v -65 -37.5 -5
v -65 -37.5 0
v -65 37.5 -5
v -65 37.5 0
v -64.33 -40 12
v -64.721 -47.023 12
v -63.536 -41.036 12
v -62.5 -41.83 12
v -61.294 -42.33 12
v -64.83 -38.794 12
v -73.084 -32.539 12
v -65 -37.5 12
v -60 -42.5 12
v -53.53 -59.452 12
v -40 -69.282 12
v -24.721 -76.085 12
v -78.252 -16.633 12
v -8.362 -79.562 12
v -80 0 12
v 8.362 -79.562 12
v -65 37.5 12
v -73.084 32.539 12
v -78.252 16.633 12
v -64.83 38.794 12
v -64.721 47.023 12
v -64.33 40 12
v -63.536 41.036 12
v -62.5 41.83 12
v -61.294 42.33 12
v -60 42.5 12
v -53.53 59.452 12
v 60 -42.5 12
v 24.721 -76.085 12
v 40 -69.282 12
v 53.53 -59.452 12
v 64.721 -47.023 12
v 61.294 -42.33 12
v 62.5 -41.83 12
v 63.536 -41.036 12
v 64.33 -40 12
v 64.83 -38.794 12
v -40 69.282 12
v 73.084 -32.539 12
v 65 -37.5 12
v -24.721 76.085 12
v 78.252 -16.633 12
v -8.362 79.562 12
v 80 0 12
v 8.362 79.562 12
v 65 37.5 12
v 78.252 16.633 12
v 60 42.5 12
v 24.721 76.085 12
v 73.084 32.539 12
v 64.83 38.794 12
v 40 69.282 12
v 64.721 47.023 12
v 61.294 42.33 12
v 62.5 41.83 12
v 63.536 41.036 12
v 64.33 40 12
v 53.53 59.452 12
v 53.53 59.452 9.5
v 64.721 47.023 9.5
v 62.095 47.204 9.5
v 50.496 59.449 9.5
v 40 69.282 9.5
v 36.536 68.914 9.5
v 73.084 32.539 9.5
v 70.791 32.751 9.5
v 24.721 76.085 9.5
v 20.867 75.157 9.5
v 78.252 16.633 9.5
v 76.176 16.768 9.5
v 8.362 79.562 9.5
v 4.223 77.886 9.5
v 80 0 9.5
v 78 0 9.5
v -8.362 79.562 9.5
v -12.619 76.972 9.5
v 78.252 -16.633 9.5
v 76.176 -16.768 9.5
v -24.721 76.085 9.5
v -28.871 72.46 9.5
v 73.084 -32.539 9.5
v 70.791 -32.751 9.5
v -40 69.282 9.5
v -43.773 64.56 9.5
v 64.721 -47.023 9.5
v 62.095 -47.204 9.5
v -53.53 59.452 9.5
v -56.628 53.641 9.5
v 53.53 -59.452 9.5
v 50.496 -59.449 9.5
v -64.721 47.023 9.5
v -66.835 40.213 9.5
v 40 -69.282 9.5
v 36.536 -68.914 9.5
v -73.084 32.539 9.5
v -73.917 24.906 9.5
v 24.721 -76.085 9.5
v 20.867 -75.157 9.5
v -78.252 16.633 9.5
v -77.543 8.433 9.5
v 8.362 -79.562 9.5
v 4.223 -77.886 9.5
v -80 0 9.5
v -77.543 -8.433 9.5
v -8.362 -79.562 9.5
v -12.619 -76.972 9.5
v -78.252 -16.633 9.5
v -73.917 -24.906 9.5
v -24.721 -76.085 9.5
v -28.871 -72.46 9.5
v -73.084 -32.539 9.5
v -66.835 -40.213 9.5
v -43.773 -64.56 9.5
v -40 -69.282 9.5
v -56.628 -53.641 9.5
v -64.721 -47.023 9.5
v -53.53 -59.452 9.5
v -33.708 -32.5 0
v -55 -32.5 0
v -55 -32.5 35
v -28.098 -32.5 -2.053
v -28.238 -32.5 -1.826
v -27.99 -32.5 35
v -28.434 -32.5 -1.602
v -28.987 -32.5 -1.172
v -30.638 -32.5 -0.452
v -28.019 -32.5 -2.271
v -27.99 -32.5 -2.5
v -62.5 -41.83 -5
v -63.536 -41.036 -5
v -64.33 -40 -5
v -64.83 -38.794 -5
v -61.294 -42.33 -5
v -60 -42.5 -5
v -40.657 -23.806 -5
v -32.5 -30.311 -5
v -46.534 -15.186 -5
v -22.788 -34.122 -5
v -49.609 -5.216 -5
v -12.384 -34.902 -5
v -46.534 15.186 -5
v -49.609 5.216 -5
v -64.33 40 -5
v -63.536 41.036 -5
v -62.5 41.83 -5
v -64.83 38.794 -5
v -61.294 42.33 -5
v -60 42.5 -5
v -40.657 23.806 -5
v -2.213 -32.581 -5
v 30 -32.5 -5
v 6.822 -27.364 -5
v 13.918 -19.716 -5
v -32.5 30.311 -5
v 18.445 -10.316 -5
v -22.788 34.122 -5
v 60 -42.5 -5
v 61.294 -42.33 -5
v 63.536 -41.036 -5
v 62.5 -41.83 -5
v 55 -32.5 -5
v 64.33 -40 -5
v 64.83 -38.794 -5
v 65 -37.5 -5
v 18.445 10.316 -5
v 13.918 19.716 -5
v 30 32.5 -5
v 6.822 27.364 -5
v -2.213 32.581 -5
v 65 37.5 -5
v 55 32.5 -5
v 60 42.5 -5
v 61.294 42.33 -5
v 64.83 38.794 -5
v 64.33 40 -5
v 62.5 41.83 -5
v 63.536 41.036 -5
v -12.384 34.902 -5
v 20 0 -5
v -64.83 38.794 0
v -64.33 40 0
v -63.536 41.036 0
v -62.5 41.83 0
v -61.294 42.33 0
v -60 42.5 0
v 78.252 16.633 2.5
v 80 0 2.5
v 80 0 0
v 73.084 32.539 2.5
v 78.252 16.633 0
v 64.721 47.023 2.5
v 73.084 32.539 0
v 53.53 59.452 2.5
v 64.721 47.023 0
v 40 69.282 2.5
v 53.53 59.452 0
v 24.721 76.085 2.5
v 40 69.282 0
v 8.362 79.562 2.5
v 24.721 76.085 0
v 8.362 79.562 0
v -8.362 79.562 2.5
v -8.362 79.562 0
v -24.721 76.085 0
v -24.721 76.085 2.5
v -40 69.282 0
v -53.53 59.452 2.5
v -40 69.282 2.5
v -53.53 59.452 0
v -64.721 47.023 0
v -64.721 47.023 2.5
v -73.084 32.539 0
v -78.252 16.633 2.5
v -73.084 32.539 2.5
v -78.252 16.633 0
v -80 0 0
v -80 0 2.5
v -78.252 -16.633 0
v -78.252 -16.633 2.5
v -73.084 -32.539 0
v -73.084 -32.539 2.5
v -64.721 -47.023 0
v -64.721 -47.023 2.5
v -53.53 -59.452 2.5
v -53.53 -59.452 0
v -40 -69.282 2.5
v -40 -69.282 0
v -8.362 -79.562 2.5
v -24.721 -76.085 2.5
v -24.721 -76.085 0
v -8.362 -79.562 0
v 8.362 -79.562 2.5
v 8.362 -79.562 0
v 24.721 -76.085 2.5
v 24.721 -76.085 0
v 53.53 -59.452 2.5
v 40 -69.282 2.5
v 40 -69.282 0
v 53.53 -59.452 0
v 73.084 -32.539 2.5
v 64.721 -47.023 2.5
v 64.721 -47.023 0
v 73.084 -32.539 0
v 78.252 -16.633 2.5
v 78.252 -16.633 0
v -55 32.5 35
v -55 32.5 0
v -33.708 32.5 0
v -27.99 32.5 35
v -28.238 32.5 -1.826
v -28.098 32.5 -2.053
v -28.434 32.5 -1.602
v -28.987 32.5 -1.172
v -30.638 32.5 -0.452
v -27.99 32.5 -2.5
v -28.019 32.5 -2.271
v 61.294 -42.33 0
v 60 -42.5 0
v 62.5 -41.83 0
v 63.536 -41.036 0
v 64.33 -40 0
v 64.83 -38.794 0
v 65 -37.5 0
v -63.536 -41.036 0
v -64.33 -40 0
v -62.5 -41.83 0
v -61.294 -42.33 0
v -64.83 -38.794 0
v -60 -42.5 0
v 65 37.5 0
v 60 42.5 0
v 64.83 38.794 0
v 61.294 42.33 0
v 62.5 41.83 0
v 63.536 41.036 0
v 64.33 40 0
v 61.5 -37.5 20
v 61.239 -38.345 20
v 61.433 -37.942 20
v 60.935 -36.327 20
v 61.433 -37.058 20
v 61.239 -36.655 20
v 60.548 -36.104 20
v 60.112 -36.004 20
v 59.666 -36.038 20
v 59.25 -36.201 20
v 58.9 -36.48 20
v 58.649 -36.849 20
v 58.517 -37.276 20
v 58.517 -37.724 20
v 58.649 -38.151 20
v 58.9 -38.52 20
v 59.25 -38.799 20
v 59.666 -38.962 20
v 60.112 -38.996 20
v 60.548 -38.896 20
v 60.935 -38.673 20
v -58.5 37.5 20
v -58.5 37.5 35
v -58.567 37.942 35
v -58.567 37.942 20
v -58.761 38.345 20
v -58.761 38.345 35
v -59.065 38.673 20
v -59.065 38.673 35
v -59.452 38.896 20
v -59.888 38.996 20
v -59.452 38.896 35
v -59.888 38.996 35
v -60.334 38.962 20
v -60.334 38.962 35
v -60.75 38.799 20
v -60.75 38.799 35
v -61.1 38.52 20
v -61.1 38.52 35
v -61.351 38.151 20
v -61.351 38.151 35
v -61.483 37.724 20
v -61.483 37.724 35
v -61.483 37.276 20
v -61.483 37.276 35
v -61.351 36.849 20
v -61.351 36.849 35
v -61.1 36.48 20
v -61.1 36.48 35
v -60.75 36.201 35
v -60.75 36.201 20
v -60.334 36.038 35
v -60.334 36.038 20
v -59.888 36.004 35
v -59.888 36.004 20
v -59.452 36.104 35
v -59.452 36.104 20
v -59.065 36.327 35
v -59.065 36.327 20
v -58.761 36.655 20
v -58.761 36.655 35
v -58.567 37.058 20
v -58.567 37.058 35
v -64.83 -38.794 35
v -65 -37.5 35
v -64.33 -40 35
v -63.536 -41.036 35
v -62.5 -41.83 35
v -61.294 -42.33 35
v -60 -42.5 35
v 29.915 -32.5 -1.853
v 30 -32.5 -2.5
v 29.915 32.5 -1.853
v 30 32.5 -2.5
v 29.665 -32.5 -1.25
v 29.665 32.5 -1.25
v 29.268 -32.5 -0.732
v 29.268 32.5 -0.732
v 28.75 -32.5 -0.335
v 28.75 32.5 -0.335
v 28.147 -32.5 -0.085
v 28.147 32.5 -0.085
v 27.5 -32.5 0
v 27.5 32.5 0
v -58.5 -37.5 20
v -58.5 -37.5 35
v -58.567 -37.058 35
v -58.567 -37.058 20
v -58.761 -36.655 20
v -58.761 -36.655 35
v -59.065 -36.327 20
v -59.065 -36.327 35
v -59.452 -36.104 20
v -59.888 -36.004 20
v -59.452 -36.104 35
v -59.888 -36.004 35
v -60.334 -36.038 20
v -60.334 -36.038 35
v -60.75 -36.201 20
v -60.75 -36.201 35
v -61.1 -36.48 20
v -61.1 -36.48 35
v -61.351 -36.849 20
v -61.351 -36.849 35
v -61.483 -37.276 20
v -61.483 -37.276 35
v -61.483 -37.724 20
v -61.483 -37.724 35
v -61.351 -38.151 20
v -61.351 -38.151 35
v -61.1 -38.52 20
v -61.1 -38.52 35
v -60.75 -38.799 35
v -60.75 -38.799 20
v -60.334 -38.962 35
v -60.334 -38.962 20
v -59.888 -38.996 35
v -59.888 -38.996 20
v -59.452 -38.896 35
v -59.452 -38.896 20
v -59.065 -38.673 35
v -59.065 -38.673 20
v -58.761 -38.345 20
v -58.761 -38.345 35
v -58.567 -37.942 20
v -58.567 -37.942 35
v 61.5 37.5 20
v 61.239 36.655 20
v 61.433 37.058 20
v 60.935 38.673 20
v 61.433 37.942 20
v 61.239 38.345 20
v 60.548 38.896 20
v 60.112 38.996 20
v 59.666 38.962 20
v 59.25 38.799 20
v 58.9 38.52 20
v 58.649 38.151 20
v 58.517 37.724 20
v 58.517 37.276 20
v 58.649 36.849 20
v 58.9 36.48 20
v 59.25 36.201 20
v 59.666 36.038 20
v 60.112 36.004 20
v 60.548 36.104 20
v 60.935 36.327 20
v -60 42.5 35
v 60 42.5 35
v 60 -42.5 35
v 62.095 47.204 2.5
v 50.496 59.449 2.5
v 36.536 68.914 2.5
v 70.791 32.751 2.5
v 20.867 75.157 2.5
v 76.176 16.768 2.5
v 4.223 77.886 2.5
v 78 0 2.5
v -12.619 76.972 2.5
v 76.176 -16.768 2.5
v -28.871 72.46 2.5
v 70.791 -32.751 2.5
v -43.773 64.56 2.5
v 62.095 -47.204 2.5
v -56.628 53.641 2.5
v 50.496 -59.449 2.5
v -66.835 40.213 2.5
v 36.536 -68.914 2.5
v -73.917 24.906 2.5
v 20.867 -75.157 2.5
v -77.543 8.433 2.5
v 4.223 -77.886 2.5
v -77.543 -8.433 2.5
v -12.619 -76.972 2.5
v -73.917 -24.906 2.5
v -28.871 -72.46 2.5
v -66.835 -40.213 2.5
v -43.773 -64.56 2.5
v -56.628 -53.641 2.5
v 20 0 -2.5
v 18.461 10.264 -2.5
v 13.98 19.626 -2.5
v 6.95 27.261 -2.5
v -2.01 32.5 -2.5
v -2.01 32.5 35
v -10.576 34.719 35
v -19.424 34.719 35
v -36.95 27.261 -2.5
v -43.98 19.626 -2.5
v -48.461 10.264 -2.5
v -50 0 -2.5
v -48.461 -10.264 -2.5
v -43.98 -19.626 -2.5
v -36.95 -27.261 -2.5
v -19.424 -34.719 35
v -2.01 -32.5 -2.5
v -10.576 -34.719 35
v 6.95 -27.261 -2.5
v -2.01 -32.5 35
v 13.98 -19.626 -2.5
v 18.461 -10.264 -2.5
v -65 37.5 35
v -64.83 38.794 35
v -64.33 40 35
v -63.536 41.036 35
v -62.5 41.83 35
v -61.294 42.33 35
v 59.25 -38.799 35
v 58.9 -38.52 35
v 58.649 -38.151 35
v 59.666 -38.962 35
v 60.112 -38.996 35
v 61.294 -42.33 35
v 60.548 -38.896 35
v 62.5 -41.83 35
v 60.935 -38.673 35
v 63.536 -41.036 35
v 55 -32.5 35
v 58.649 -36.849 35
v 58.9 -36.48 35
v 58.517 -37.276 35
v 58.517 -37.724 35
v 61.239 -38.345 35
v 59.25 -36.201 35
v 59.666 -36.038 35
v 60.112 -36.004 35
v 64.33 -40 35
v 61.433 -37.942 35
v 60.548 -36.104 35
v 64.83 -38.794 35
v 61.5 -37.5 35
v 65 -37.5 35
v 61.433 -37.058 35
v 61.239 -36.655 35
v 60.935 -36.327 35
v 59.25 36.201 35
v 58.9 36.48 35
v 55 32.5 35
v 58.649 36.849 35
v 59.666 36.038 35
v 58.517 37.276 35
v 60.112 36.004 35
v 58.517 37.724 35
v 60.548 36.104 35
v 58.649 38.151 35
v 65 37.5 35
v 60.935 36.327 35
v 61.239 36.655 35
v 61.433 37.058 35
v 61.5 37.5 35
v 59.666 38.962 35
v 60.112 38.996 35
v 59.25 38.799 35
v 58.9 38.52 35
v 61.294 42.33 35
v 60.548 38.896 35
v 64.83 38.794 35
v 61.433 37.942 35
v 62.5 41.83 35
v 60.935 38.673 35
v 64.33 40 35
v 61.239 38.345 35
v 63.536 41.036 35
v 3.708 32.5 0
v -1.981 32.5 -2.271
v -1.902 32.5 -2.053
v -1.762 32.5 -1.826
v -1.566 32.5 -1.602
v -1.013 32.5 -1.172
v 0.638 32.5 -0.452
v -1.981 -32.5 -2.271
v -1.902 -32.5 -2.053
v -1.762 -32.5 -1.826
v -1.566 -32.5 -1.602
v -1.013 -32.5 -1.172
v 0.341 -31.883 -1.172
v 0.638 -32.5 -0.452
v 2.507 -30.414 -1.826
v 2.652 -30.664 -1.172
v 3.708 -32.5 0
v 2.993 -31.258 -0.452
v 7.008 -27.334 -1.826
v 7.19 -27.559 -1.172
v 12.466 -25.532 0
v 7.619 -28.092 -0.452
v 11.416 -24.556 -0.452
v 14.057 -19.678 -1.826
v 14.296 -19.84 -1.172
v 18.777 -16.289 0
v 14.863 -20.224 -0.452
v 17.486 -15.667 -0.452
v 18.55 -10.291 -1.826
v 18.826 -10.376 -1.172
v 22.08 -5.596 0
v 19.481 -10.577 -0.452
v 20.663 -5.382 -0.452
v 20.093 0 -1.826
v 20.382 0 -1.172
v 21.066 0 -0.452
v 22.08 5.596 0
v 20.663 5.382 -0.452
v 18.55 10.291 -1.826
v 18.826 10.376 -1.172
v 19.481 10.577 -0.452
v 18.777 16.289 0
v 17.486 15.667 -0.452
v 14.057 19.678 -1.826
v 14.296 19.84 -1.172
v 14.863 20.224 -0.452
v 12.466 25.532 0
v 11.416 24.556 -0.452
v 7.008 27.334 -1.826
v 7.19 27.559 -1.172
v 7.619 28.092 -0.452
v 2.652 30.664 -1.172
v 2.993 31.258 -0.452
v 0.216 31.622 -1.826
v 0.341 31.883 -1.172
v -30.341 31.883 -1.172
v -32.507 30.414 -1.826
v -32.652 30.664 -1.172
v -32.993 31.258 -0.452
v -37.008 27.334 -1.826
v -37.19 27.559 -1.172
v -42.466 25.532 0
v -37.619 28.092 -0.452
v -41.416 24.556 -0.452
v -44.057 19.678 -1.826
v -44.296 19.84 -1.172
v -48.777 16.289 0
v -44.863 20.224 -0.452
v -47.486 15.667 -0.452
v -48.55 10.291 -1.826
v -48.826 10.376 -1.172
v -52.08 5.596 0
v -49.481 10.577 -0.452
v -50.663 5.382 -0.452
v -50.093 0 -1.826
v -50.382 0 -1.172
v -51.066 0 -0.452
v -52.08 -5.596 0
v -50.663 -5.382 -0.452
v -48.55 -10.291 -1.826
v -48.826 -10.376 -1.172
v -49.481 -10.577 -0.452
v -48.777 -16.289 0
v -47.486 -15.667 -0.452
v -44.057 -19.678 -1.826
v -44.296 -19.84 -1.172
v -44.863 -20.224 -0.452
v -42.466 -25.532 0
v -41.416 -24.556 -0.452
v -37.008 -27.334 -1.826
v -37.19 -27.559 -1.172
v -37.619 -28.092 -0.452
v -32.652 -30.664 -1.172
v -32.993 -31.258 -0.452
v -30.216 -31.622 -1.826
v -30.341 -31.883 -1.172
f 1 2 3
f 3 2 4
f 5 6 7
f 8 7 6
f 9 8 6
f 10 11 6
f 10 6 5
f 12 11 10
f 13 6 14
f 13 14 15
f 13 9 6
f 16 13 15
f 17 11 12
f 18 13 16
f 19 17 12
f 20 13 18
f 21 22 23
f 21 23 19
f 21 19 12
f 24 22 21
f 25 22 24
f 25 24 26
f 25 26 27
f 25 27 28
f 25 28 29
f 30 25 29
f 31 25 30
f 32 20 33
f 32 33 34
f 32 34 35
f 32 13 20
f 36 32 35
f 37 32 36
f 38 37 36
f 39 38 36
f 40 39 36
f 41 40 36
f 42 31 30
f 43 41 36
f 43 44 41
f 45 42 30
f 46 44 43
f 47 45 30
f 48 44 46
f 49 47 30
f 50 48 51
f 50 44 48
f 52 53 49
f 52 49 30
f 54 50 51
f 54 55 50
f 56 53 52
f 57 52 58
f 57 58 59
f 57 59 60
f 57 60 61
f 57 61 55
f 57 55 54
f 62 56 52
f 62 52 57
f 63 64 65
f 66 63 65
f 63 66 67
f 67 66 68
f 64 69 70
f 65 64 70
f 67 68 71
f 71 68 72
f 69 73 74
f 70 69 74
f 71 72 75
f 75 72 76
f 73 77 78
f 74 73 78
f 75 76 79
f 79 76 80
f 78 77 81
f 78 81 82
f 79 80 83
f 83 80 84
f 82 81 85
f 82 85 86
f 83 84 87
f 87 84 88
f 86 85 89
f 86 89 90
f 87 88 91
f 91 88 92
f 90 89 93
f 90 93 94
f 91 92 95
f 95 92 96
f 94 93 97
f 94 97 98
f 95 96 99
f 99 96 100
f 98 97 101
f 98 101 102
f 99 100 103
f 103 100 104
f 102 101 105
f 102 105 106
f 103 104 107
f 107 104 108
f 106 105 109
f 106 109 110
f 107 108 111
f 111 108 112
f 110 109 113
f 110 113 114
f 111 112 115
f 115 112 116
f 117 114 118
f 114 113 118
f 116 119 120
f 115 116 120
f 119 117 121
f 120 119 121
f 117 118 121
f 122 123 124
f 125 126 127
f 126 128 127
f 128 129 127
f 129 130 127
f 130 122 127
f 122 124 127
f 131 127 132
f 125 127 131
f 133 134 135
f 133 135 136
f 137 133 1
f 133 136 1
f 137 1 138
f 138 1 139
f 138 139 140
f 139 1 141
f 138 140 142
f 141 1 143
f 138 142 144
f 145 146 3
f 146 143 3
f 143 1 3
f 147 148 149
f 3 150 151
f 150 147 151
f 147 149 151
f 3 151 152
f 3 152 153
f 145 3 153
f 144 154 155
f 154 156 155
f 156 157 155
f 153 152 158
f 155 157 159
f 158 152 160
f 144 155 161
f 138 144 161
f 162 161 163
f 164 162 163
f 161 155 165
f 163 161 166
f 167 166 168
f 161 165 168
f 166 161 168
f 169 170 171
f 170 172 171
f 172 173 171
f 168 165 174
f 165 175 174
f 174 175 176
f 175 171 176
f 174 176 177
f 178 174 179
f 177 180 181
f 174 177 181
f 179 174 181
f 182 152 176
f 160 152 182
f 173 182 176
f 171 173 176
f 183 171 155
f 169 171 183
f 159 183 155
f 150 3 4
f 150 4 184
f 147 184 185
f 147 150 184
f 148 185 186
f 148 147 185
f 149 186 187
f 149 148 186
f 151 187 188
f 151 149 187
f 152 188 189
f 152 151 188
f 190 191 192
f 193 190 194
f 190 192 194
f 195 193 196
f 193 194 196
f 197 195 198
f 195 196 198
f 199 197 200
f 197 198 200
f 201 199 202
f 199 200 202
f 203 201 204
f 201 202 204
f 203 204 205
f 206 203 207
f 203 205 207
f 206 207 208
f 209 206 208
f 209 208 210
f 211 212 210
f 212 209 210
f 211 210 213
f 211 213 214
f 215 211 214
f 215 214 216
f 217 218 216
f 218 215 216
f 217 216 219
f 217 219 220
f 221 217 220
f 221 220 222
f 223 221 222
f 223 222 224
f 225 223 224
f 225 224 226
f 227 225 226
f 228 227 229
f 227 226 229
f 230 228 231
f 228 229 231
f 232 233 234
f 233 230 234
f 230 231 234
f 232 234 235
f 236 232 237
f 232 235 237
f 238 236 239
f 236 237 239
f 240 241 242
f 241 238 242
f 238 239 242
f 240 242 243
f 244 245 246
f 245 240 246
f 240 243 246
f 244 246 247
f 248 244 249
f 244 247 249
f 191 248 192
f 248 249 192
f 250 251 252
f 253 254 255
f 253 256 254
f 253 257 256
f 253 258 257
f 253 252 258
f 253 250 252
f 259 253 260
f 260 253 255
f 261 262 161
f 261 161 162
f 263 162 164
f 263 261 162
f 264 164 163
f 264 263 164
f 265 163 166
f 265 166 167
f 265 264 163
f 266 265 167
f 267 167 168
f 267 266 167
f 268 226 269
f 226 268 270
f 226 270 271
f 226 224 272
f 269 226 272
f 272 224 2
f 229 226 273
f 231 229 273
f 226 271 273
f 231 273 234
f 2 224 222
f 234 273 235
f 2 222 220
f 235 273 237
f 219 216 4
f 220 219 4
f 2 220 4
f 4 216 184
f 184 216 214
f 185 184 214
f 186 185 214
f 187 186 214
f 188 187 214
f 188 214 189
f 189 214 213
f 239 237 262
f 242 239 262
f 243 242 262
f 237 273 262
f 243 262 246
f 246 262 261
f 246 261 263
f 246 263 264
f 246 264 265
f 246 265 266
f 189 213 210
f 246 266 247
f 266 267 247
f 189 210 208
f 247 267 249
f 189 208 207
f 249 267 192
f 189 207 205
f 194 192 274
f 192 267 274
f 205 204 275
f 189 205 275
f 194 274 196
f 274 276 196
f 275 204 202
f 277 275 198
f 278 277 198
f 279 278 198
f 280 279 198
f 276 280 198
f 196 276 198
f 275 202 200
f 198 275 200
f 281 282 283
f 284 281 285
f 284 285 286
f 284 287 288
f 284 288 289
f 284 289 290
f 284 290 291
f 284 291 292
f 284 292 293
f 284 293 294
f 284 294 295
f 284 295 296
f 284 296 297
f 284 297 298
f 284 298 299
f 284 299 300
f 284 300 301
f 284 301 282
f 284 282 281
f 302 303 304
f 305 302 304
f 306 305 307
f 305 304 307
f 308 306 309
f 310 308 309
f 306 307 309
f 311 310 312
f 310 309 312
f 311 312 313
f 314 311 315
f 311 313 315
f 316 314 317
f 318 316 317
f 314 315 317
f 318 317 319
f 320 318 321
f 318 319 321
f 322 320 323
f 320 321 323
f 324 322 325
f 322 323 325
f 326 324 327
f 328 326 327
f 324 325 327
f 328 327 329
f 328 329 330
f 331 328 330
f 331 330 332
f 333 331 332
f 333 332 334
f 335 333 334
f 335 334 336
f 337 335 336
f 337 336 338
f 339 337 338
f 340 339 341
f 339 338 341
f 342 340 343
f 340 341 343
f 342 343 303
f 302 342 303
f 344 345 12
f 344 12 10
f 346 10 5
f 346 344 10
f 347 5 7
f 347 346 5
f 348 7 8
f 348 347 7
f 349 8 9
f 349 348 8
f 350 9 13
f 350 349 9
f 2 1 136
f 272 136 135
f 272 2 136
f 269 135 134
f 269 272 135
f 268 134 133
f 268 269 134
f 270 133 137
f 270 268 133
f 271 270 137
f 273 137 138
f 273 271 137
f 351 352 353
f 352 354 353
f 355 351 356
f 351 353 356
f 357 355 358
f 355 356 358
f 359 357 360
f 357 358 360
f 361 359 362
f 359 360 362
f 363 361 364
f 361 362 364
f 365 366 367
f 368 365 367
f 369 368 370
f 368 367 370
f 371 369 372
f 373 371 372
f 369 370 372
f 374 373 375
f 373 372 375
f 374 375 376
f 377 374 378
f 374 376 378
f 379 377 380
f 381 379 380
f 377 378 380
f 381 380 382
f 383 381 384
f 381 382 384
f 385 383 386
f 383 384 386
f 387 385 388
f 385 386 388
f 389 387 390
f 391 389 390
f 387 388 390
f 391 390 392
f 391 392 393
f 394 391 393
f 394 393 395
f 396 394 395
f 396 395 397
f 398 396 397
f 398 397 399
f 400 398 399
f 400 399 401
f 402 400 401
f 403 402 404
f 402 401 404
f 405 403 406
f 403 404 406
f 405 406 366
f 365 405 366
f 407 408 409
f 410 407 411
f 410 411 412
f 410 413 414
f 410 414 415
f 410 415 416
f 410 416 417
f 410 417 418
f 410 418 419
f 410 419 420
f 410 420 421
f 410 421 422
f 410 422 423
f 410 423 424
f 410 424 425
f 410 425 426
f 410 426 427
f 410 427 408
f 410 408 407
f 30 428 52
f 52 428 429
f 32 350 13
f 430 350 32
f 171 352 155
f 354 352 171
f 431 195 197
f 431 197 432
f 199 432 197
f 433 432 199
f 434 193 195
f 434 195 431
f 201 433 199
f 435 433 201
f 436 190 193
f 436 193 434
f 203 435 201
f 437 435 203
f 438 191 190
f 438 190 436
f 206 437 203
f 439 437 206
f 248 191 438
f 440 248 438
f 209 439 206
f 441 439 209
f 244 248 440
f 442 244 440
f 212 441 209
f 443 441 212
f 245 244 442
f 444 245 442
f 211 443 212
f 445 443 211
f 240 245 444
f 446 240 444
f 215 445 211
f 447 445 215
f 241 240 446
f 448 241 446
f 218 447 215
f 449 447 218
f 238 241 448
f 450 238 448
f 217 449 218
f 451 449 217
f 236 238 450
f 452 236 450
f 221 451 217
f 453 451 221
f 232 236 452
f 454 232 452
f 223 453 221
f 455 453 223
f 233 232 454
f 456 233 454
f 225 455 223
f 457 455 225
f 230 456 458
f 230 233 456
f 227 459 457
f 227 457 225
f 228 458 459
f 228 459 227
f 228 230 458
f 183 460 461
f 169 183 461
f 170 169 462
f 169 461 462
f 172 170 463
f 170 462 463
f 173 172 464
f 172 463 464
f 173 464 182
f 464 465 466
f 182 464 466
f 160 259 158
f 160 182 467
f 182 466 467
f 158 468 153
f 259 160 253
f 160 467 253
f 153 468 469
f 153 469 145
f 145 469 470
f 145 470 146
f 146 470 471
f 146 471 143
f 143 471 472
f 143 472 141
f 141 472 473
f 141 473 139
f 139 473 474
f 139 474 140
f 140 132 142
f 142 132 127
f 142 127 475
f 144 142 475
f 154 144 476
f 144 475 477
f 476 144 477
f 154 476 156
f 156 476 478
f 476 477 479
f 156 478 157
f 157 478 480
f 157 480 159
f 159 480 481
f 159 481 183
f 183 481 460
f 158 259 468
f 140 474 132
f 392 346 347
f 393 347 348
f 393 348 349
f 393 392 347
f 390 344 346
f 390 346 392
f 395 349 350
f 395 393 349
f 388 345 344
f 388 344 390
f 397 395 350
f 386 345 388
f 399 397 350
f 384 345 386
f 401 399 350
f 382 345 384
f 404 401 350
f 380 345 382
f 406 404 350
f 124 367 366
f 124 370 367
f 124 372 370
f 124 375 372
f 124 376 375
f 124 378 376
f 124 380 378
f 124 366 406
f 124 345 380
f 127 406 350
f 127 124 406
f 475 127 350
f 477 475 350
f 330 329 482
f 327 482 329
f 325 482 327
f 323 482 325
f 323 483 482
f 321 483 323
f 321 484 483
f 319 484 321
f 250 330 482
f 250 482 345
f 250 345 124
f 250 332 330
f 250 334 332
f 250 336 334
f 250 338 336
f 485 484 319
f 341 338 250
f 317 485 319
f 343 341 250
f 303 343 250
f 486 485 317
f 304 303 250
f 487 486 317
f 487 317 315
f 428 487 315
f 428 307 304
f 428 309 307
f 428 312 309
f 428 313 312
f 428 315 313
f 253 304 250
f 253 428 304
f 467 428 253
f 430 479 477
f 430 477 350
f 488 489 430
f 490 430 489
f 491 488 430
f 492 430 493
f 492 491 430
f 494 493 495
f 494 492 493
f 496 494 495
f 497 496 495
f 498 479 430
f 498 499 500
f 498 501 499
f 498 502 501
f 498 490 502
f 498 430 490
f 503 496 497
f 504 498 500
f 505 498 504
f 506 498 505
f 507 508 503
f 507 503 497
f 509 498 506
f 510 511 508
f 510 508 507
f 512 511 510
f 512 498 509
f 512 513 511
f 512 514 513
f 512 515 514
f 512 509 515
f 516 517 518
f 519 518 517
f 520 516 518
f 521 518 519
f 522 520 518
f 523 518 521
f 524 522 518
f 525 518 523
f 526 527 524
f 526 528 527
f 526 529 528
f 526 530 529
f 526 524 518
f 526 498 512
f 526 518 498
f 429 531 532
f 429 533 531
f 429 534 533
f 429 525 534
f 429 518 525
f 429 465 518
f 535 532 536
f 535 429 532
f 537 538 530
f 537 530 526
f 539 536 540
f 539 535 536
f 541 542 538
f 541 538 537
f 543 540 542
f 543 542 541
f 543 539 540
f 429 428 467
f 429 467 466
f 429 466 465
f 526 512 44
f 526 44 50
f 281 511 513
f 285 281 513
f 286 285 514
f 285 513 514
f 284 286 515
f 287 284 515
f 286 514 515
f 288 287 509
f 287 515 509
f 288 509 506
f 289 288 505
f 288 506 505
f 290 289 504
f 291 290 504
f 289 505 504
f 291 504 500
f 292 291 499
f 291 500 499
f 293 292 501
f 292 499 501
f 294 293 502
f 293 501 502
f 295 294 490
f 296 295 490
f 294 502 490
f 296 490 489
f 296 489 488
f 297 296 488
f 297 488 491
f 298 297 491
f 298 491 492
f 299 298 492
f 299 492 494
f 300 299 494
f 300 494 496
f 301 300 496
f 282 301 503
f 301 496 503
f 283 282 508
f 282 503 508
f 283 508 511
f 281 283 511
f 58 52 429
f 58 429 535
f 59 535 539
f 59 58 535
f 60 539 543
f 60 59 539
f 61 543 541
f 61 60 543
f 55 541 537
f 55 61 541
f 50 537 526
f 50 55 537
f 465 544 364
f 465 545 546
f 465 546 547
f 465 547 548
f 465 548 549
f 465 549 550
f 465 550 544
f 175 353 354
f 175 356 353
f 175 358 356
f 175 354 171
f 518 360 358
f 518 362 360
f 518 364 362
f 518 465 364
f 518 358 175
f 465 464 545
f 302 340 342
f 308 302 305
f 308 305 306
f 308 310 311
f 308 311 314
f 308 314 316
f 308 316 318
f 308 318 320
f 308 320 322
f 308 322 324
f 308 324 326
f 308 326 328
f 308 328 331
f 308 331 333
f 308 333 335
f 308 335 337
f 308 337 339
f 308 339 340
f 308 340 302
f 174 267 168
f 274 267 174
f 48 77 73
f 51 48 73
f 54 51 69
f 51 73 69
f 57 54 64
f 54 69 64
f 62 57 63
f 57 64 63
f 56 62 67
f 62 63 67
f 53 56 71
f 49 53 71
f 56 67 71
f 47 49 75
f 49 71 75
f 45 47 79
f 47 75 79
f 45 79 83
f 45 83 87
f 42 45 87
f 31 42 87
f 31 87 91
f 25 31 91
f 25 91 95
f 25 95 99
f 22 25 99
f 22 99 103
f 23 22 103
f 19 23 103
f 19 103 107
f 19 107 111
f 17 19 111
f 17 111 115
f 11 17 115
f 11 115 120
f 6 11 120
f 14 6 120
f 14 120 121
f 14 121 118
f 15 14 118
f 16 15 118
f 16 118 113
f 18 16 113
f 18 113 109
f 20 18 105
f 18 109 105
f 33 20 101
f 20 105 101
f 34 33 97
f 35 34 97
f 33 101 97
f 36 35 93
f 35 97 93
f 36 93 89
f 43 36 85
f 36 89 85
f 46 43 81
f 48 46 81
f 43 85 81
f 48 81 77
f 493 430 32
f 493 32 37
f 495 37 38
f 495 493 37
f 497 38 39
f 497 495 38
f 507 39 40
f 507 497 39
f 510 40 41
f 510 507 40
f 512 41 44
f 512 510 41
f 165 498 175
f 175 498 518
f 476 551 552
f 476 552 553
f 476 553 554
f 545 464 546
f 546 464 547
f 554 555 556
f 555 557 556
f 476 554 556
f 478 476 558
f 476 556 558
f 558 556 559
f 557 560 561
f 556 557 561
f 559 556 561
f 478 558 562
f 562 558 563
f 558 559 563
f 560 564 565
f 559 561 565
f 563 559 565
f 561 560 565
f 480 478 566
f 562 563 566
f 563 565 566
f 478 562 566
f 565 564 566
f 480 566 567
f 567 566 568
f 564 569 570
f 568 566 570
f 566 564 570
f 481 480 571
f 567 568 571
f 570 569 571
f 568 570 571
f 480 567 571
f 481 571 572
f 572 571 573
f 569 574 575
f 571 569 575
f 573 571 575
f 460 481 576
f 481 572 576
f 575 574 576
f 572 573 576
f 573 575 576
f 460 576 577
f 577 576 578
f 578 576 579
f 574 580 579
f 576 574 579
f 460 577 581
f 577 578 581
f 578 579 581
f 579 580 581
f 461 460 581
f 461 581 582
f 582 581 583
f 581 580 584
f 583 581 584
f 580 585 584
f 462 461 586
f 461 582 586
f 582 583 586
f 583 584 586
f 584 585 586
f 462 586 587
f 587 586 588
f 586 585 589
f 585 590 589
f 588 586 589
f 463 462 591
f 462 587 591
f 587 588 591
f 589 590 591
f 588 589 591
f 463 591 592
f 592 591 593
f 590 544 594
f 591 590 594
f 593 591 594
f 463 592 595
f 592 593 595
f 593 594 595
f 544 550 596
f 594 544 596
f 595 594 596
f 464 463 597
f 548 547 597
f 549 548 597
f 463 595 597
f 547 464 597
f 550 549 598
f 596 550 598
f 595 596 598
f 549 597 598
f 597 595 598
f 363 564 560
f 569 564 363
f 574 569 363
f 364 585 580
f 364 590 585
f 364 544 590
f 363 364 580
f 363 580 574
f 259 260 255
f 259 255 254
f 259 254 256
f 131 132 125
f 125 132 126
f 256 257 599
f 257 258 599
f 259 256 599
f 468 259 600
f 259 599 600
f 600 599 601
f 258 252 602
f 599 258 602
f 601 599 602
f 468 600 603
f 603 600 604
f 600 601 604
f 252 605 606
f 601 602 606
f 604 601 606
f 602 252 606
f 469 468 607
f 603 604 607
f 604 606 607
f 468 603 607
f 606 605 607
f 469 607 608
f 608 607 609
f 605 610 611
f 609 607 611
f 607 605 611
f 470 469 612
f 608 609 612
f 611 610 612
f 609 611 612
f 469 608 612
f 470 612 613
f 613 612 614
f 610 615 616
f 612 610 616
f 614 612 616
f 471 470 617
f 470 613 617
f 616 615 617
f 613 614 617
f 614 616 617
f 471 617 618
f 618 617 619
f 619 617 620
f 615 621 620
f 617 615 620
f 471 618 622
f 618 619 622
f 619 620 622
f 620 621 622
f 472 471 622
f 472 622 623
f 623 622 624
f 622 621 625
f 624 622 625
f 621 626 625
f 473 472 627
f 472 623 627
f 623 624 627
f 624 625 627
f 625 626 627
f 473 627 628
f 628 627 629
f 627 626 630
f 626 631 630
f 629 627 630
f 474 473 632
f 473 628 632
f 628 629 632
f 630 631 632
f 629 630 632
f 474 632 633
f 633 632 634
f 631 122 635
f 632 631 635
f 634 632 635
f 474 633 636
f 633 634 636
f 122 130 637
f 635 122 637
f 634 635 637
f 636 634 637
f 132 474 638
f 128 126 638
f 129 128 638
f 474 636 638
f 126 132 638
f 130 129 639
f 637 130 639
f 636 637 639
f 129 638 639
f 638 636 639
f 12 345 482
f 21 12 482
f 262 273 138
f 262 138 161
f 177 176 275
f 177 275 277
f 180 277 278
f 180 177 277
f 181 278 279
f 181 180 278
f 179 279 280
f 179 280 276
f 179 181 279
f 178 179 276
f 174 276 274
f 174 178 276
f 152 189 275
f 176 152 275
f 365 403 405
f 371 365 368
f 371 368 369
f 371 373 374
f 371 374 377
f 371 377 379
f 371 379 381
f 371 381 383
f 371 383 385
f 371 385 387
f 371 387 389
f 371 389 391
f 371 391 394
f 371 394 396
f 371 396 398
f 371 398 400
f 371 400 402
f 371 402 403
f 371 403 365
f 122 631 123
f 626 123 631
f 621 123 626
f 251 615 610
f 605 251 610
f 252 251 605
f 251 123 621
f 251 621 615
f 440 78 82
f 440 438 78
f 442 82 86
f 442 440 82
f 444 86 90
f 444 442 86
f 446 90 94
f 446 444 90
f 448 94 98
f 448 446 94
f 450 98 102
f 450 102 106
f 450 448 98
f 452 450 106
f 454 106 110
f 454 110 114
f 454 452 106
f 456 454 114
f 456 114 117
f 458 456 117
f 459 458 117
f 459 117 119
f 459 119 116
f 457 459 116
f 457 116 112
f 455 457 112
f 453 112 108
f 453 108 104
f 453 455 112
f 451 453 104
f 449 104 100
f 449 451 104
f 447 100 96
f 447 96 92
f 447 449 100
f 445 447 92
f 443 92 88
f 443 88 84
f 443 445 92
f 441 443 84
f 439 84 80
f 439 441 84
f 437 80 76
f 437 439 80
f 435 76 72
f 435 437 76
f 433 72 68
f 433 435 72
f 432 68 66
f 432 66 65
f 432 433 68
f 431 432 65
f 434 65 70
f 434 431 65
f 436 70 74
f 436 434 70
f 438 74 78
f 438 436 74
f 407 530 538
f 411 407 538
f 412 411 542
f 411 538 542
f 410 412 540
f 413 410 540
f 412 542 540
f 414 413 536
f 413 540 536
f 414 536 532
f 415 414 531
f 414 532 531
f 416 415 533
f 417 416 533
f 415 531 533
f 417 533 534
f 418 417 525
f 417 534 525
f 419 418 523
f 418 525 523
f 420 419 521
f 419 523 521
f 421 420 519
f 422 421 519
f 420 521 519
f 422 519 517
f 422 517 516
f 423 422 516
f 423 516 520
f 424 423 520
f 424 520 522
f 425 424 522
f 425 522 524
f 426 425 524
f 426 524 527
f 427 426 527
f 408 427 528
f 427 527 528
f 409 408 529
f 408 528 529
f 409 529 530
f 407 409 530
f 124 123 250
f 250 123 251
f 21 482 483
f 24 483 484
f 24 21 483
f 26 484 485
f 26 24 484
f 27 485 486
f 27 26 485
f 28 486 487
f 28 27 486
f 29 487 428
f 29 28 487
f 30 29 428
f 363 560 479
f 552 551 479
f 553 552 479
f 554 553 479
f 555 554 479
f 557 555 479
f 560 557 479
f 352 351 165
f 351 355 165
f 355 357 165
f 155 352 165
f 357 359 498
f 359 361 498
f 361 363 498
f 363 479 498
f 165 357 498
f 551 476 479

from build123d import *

# Parameters (mm, degrees)
SKETCH1_W           = 130
SKETCH1_H           = 85
SKETCH1_W_2         = 110
SKETCH1_H_2         = 65
BOSS_EXTRUDE1_DEPTH = 35
SKETCH2_W           = 130
SKETCH2_H           = 85
SKETCH2_R           = 35
SKETCH2_W_2         = 25
SKETCH2_H_2         = 65
BOSS_EXTRUDE2_DEPTH = 5
CUT_EXTRUDE1_START  = 45
SKETCH2_2_R         = 35
CUT_EXTRUDE1_DEPTH  = 45
SKETCH3_R           = 1.5
CUT_EXTRUDE2_DEPTH  = 15
FILLET1_R           = 5
FILLET2_R           = 2.5
SKETCH4_R           = 80
BOSS_EXTRUDE3_DEPTH = 12
SKETCH5_W           = 7
SKETCH5_H           = 2


with BuildPart() as part:
    # Sketch1 → Boss-Extrude1 (new body)
    with BuildSketch(Plane.XY):
        Rectangle(SKETCH1_W, SKETCH1_H)
        Rectangle(SKETCH1_W_2, SKETCH1_H_2, mode=Mode.SUBTRACT)
    extrude(amount=BOSS_EXTRUDE1_DEPTH)

    # Sketch2 → Boss-Extrude2 (add)
    with BuildSketch(Plane.XY):
        Rectangle(SKETCH2_W, SKETCH2_H)
        with Locations((-15, 0)):
            Circle(SKETCH2_R, mode=Mode.SUBTRACT)
        with Locations((42.5, 0)):
            Rectangle(SKETCH2_W_2, SKETCH2_H_2, mode=Mode.SUBTRACT)
    extrude(amount=-BOSS_EXTRUDE2_DEPTH)

    # Sketch2<2> → Cut-Extrude1 (cut)
    with BuildSketch(Plane.XY.offset(CUT_EXTRUDE1_START)):
        with Locations((-15, 0)):
            Circle(SKETCH2_2_R)
    extrude(amount=-CUT_EXTRUDE1_DEPTH, mode=Mode.SUBTRACT)

    # Sketch3 → Cut-Extrude2 (cut)
    with BuildSketch(Plane.XY.offset(35)):
        with Locations((-60, 37.5)):
            Circle(SKETCH3_R)
        with Locations((60, 37.5)):
            Circle(SKETCH3_R)
        with Locations((-60, -37.5)):
            Circle(SKETCH3_R)
        with Locations((60, -37.5)):
            Circle(SKETCH3_R)
    extrude(amount=-CUT_EXTRUDE2_DEPTH, mode=Mode.SUBTRACT)

    # Fillet1
    fillet1_edges = [part.edges().sort_by_distance(p)[0] for p in [
        (65, -42.5, 15),
        (-65, -42.5, 15),
        (65, 42.5, 15),
        (-65, 42.5, 15),
    ]]
    fillet(fillet1_edges, radius=FILLET1_R)

    # Fillet2
    fillet2_edges = [part.edges().sort_by_distance(p)[0] for p in [
        (30, 0, 0),
        (13.979849352, 19.625705886, 0),
        (-50, 0, 0),
    ]]
    fillet(fillet2_edges, radius=FILLET2_R)

    # Sketch4 → Boss-Extrude3 (add)
    with BuildSketch(Plane.XY):
        Circle(SKETCH4_R)
        Polygon((60, 42.5), (-60, 42.5), (-65, 37.5), (-65, -37.5), (-60, -42.5), (60, -42.5), (65, -37.5), (65, 37.5), align=None, mode=Mode.SUBTRACT)
    extrude(amount=BOSS_EXTRUDE3_DEPTH)

    # Sketch5 → Cut-Revolve1 (revolve, cut)
    with BuildSketch(Plane(origin=(0, 0, 0), x_dir=(0, 0, -1), z_dir=(1, 0, 0))):
        with Locations((-6, 79)):
            Rectangle(SKETCH5_W, SKETCH5_H)
    revolve(axis=Axis((0, 0, 0), (0, 0, -1)), mode=Mode.SUBTRACT)


solid = part.part
